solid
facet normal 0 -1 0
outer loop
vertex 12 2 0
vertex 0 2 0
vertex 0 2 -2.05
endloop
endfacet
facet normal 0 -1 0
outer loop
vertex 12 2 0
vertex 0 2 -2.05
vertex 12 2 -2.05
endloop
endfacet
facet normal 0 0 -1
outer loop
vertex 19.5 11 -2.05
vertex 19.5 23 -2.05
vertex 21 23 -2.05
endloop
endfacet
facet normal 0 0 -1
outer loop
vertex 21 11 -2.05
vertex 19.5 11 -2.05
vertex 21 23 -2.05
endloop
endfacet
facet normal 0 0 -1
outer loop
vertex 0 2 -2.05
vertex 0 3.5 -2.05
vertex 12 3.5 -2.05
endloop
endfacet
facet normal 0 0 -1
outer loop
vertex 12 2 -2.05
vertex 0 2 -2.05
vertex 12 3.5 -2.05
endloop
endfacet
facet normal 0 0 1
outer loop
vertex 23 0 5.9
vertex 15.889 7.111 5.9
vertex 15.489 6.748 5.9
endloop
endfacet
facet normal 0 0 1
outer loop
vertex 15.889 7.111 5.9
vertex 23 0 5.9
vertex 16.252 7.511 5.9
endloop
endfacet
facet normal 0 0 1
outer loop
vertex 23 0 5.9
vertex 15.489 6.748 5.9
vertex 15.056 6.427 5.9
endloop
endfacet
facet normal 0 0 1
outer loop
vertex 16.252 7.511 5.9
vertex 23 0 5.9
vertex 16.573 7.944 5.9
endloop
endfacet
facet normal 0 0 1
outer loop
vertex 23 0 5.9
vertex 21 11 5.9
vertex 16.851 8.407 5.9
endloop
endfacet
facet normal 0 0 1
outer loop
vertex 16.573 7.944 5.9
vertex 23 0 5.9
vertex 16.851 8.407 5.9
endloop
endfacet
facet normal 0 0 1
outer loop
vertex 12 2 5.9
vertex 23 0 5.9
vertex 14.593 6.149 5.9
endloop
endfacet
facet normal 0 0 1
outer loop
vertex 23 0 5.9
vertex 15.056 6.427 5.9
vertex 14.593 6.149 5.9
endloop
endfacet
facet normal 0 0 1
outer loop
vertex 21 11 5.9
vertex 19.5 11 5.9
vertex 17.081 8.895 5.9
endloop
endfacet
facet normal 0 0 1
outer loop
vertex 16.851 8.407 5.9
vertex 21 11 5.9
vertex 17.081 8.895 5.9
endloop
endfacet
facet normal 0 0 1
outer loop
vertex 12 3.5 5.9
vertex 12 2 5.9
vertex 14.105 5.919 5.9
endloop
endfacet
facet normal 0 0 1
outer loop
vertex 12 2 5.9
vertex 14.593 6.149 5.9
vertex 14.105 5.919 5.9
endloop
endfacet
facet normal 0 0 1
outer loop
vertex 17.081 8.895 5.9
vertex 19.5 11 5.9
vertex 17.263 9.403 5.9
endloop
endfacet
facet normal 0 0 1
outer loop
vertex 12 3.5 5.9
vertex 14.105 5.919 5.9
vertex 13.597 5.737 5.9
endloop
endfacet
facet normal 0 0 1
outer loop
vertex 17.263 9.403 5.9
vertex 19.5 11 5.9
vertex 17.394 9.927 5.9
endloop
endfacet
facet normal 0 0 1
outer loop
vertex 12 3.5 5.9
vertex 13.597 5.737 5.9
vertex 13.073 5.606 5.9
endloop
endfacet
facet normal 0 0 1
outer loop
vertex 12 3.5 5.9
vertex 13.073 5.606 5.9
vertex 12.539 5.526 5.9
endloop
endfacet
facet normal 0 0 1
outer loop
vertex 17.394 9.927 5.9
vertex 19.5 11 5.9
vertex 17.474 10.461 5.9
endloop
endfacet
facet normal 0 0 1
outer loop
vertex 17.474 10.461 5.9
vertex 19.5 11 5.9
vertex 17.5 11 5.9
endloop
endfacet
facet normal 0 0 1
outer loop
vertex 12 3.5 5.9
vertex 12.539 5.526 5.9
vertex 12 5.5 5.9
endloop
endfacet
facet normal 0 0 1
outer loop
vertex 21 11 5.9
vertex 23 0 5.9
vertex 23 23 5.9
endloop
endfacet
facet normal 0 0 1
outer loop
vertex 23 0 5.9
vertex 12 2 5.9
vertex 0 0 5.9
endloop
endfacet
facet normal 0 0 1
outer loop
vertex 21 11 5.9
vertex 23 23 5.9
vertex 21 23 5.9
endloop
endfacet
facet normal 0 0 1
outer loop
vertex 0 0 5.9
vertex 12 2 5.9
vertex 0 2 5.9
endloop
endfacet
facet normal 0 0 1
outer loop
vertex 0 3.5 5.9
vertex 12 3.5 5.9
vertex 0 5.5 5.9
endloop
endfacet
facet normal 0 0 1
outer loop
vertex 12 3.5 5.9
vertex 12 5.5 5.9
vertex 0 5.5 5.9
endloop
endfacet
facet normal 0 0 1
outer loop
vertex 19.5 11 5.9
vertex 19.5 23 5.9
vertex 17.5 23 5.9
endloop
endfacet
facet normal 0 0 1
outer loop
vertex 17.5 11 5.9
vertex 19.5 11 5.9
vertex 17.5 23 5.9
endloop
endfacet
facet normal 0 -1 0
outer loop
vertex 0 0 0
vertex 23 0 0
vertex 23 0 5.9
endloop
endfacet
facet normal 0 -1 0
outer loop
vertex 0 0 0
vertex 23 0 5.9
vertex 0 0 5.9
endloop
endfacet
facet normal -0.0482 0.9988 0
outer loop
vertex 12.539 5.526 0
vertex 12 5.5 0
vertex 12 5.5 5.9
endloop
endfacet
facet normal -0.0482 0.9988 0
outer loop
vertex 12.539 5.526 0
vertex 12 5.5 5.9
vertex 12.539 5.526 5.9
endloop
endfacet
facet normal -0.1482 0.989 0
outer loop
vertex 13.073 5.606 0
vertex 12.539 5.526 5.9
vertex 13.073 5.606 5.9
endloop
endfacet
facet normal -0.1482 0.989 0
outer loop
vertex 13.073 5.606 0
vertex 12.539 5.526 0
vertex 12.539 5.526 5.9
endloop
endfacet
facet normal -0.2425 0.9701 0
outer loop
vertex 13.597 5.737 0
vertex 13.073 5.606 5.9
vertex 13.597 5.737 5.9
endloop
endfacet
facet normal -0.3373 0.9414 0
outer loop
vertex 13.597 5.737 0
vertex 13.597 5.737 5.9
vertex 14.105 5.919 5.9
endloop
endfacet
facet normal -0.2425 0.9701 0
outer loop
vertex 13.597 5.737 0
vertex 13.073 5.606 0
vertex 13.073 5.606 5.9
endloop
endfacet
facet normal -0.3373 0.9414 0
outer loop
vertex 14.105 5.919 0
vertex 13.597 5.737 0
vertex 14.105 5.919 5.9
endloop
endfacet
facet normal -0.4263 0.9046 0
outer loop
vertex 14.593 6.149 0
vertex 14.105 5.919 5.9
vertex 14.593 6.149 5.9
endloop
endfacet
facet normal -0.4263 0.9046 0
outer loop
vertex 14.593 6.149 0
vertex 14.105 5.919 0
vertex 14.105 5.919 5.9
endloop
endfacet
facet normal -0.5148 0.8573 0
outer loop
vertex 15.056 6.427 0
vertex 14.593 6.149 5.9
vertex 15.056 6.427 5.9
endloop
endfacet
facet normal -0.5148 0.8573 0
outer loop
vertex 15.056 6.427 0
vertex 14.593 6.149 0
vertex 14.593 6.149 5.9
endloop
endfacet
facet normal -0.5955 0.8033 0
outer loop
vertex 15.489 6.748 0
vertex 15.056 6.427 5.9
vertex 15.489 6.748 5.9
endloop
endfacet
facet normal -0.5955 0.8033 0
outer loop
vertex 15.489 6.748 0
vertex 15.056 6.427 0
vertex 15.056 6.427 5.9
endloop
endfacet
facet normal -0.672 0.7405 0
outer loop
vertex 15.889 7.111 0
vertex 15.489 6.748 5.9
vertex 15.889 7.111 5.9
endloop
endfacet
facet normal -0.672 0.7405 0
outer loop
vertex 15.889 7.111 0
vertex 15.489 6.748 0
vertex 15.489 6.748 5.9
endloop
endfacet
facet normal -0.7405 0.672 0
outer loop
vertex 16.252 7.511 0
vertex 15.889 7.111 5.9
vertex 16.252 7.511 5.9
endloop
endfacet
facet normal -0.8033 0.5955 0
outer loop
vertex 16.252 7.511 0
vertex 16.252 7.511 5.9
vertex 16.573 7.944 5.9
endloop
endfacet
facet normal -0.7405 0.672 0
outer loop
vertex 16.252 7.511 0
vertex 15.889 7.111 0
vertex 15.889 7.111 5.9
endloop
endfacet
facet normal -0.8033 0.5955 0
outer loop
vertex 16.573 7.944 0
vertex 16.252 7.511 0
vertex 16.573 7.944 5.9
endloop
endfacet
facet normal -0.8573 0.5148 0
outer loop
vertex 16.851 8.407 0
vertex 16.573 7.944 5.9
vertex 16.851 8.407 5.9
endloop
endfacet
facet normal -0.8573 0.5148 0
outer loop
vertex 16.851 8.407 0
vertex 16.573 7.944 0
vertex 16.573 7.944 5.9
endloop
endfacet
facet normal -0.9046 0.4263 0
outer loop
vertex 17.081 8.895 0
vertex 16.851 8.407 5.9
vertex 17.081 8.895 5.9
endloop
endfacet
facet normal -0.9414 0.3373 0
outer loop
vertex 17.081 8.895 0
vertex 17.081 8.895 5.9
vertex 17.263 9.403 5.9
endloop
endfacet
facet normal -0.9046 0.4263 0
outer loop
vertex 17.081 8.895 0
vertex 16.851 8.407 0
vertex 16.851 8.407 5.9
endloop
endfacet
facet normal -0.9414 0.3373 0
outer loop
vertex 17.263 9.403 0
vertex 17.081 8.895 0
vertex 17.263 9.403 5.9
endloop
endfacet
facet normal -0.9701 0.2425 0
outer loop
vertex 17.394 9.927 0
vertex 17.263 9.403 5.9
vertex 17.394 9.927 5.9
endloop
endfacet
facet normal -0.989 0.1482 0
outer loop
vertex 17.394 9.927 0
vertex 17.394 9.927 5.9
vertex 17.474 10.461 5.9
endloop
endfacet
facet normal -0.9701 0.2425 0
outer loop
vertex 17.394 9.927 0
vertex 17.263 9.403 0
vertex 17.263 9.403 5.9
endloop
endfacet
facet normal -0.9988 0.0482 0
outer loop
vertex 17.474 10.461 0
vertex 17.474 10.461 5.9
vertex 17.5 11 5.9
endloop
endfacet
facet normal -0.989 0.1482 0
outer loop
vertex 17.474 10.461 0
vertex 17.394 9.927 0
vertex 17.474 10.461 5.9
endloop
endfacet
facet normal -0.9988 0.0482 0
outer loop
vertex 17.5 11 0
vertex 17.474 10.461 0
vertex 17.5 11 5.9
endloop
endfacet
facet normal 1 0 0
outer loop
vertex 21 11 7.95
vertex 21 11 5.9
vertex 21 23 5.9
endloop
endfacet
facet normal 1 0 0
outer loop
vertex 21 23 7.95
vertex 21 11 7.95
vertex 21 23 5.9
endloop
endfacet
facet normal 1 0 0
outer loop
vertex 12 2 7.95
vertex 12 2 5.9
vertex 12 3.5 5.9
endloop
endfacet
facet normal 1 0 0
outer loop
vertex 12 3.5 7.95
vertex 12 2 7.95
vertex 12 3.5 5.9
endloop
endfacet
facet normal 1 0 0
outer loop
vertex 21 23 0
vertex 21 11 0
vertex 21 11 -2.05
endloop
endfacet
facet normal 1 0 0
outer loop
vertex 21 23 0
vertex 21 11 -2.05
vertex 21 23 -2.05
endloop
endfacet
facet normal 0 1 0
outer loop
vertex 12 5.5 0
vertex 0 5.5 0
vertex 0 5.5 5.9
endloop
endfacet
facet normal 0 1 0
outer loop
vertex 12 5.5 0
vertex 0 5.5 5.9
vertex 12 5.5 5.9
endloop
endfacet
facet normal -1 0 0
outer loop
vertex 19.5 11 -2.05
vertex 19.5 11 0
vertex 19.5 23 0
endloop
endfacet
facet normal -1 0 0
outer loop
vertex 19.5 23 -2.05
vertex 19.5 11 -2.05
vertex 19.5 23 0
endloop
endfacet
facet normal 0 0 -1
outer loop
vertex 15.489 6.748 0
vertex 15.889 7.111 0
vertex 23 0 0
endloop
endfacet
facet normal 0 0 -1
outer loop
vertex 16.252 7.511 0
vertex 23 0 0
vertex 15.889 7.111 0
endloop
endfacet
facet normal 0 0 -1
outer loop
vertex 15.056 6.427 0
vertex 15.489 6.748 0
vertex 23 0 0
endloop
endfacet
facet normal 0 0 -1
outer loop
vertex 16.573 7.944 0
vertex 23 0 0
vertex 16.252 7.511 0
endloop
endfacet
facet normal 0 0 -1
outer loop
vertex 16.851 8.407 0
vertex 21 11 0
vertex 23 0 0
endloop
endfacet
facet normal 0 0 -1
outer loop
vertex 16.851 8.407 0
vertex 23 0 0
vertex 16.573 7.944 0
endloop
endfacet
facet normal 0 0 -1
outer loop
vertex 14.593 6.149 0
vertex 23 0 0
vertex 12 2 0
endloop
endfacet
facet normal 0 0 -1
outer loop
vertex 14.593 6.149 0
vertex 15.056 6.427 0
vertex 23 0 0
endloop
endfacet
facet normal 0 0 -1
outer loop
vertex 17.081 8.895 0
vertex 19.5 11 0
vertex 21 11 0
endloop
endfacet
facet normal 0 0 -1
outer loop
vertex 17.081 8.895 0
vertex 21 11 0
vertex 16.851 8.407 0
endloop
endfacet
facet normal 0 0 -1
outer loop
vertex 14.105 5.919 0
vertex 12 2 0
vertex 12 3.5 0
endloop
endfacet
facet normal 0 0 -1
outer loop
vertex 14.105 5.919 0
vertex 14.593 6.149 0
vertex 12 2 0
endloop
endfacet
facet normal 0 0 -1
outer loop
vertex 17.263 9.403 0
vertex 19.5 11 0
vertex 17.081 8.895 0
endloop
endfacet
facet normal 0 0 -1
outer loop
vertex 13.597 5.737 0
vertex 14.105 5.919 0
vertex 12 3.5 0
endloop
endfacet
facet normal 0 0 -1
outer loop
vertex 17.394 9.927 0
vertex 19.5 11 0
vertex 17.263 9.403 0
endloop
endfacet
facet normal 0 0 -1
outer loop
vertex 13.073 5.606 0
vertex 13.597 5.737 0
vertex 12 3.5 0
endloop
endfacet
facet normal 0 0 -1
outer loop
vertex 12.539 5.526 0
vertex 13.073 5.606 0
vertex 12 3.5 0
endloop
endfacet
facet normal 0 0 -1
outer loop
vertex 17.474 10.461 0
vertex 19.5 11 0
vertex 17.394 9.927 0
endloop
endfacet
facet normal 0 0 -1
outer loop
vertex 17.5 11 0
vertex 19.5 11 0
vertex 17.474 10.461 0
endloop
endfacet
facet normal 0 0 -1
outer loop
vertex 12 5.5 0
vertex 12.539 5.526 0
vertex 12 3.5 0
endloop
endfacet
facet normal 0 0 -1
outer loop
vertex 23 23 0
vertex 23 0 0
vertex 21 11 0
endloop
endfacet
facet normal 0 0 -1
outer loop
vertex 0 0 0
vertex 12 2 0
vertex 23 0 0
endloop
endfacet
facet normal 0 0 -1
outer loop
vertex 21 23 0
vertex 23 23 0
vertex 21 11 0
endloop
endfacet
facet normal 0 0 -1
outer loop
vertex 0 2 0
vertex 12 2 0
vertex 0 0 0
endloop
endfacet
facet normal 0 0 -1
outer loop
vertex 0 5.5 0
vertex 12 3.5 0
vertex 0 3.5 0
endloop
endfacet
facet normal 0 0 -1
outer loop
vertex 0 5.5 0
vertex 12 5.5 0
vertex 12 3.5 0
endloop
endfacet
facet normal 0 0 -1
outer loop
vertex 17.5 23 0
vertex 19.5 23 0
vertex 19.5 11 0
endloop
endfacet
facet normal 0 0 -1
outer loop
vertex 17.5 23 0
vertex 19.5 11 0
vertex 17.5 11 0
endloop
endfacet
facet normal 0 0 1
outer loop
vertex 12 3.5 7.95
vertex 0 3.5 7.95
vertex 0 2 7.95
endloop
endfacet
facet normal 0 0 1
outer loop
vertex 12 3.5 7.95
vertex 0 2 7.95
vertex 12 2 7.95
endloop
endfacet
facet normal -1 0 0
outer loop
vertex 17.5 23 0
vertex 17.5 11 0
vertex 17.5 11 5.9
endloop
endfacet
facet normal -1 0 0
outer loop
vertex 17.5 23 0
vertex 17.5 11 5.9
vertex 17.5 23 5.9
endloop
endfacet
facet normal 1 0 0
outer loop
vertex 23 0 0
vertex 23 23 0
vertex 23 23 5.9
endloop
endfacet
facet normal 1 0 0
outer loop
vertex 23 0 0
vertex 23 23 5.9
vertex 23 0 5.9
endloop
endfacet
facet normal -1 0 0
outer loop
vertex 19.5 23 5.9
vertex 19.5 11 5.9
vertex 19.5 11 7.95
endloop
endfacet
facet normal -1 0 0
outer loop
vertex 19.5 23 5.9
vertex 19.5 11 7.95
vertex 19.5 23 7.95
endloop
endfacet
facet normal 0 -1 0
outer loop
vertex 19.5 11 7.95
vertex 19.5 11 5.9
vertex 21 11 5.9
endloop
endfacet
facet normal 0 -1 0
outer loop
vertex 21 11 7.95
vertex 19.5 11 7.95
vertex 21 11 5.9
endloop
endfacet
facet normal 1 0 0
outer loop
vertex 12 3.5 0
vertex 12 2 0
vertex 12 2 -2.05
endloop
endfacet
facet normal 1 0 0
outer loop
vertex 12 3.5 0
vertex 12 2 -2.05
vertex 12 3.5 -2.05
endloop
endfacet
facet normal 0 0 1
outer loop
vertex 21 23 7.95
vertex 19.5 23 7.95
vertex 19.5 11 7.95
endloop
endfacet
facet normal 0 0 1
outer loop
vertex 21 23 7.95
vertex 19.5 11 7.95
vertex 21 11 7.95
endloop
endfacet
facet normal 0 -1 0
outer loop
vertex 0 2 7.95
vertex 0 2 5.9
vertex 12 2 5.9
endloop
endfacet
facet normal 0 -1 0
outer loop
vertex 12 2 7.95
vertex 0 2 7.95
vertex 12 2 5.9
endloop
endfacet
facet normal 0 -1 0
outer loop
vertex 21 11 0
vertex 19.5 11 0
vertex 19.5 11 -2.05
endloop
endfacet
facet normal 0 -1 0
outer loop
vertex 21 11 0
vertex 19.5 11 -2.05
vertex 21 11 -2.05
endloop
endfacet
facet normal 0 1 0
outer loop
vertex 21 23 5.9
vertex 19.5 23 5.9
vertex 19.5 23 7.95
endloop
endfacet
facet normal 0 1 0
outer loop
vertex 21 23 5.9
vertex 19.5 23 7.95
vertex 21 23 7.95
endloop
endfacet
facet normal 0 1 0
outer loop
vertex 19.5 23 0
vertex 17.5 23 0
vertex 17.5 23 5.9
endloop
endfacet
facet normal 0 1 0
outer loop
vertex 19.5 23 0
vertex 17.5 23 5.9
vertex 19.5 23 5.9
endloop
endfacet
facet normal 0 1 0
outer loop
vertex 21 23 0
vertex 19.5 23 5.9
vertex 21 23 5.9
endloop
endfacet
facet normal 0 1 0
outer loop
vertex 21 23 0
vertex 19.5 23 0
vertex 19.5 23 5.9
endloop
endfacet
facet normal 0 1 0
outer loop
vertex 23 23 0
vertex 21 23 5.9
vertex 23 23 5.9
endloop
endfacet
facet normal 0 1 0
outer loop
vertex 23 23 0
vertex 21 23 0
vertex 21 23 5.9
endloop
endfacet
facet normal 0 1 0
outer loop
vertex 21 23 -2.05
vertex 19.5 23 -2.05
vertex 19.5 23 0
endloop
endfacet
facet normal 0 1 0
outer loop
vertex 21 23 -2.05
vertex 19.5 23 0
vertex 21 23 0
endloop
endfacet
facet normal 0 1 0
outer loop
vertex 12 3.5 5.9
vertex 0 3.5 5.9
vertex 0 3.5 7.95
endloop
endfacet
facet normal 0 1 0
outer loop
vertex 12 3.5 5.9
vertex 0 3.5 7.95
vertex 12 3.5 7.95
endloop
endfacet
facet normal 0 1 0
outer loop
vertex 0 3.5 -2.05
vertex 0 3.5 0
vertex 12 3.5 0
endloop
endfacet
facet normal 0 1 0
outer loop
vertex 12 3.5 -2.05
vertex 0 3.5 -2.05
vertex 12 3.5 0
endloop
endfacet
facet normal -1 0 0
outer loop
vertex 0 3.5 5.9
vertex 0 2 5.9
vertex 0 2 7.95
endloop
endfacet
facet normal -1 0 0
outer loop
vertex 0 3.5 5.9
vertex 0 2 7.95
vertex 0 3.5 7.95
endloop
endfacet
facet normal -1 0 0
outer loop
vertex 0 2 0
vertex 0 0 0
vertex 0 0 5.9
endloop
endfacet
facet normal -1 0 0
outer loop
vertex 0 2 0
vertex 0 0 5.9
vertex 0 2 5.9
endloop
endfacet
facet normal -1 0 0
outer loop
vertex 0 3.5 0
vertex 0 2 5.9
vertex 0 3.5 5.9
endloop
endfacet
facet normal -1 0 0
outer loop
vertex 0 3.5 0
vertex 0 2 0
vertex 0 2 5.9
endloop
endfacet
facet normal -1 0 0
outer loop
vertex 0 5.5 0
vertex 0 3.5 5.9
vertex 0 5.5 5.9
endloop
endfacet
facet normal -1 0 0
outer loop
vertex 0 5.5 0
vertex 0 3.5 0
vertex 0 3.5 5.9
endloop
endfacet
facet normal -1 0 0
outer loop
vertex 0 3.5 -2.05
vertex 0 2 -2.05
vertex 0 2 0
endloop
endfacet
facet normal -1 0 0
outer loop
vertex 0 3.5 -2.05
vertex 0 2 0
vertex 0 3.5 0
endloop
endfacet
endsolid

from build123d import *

# Parameters (mm, degrees)
BOSS_EXTRUDE1_DEPTH = 5.9
SKETCH2_W           = 12
SKETCH2_H           = 1.5
SKETCH2_W_2         = 1.5
SKETCH2_H_2         = 12
BOSS_EXTRUDE2_DEPTH = 2.05


with BuildPart() as part:
    # Sketch1 → Boss-Extrude1 (new body)
    with BuildSketch(Plane.XY):
        with BuildLine():
            Line((0, 5.5), (12, 5.5))
            ThreePointArc((12, 5.5), (15.889087297, 7.110912703), (17.5, 11))
            Line((17.5, 11), (17.5, 23))
            Line((17.5, 23), (23, 23))
            Line((23, 23), (23, 0))
            Line((23, 0), (0, 0))
            Line((0, 0), (0, 5.5))
        make_face()
    extrude(amount=BOSS_EXTRUDE1_DEPTH)

    # Sketch2 → Boss-Extrude2 (add)
    with BuildSketch(Plane.XY.offset(5.9)):
        with Locations((6, 2.75)):
            Rectangle(SKETCH2_W, SKETCH2_H)
        with Locations((20.25, 17)):
            Rectangle(SKETCH2_W_2, SKETCH2_H_2)
    boss_extrude2 = extrude(amount=BOSS_EXTRUDE2_DEPTH)

    # Mirror1: Boss-Extrude2 across plane
    add(boss_extrude2.mirror(Plane.XY.offset(2.95)))


solid = part.part
